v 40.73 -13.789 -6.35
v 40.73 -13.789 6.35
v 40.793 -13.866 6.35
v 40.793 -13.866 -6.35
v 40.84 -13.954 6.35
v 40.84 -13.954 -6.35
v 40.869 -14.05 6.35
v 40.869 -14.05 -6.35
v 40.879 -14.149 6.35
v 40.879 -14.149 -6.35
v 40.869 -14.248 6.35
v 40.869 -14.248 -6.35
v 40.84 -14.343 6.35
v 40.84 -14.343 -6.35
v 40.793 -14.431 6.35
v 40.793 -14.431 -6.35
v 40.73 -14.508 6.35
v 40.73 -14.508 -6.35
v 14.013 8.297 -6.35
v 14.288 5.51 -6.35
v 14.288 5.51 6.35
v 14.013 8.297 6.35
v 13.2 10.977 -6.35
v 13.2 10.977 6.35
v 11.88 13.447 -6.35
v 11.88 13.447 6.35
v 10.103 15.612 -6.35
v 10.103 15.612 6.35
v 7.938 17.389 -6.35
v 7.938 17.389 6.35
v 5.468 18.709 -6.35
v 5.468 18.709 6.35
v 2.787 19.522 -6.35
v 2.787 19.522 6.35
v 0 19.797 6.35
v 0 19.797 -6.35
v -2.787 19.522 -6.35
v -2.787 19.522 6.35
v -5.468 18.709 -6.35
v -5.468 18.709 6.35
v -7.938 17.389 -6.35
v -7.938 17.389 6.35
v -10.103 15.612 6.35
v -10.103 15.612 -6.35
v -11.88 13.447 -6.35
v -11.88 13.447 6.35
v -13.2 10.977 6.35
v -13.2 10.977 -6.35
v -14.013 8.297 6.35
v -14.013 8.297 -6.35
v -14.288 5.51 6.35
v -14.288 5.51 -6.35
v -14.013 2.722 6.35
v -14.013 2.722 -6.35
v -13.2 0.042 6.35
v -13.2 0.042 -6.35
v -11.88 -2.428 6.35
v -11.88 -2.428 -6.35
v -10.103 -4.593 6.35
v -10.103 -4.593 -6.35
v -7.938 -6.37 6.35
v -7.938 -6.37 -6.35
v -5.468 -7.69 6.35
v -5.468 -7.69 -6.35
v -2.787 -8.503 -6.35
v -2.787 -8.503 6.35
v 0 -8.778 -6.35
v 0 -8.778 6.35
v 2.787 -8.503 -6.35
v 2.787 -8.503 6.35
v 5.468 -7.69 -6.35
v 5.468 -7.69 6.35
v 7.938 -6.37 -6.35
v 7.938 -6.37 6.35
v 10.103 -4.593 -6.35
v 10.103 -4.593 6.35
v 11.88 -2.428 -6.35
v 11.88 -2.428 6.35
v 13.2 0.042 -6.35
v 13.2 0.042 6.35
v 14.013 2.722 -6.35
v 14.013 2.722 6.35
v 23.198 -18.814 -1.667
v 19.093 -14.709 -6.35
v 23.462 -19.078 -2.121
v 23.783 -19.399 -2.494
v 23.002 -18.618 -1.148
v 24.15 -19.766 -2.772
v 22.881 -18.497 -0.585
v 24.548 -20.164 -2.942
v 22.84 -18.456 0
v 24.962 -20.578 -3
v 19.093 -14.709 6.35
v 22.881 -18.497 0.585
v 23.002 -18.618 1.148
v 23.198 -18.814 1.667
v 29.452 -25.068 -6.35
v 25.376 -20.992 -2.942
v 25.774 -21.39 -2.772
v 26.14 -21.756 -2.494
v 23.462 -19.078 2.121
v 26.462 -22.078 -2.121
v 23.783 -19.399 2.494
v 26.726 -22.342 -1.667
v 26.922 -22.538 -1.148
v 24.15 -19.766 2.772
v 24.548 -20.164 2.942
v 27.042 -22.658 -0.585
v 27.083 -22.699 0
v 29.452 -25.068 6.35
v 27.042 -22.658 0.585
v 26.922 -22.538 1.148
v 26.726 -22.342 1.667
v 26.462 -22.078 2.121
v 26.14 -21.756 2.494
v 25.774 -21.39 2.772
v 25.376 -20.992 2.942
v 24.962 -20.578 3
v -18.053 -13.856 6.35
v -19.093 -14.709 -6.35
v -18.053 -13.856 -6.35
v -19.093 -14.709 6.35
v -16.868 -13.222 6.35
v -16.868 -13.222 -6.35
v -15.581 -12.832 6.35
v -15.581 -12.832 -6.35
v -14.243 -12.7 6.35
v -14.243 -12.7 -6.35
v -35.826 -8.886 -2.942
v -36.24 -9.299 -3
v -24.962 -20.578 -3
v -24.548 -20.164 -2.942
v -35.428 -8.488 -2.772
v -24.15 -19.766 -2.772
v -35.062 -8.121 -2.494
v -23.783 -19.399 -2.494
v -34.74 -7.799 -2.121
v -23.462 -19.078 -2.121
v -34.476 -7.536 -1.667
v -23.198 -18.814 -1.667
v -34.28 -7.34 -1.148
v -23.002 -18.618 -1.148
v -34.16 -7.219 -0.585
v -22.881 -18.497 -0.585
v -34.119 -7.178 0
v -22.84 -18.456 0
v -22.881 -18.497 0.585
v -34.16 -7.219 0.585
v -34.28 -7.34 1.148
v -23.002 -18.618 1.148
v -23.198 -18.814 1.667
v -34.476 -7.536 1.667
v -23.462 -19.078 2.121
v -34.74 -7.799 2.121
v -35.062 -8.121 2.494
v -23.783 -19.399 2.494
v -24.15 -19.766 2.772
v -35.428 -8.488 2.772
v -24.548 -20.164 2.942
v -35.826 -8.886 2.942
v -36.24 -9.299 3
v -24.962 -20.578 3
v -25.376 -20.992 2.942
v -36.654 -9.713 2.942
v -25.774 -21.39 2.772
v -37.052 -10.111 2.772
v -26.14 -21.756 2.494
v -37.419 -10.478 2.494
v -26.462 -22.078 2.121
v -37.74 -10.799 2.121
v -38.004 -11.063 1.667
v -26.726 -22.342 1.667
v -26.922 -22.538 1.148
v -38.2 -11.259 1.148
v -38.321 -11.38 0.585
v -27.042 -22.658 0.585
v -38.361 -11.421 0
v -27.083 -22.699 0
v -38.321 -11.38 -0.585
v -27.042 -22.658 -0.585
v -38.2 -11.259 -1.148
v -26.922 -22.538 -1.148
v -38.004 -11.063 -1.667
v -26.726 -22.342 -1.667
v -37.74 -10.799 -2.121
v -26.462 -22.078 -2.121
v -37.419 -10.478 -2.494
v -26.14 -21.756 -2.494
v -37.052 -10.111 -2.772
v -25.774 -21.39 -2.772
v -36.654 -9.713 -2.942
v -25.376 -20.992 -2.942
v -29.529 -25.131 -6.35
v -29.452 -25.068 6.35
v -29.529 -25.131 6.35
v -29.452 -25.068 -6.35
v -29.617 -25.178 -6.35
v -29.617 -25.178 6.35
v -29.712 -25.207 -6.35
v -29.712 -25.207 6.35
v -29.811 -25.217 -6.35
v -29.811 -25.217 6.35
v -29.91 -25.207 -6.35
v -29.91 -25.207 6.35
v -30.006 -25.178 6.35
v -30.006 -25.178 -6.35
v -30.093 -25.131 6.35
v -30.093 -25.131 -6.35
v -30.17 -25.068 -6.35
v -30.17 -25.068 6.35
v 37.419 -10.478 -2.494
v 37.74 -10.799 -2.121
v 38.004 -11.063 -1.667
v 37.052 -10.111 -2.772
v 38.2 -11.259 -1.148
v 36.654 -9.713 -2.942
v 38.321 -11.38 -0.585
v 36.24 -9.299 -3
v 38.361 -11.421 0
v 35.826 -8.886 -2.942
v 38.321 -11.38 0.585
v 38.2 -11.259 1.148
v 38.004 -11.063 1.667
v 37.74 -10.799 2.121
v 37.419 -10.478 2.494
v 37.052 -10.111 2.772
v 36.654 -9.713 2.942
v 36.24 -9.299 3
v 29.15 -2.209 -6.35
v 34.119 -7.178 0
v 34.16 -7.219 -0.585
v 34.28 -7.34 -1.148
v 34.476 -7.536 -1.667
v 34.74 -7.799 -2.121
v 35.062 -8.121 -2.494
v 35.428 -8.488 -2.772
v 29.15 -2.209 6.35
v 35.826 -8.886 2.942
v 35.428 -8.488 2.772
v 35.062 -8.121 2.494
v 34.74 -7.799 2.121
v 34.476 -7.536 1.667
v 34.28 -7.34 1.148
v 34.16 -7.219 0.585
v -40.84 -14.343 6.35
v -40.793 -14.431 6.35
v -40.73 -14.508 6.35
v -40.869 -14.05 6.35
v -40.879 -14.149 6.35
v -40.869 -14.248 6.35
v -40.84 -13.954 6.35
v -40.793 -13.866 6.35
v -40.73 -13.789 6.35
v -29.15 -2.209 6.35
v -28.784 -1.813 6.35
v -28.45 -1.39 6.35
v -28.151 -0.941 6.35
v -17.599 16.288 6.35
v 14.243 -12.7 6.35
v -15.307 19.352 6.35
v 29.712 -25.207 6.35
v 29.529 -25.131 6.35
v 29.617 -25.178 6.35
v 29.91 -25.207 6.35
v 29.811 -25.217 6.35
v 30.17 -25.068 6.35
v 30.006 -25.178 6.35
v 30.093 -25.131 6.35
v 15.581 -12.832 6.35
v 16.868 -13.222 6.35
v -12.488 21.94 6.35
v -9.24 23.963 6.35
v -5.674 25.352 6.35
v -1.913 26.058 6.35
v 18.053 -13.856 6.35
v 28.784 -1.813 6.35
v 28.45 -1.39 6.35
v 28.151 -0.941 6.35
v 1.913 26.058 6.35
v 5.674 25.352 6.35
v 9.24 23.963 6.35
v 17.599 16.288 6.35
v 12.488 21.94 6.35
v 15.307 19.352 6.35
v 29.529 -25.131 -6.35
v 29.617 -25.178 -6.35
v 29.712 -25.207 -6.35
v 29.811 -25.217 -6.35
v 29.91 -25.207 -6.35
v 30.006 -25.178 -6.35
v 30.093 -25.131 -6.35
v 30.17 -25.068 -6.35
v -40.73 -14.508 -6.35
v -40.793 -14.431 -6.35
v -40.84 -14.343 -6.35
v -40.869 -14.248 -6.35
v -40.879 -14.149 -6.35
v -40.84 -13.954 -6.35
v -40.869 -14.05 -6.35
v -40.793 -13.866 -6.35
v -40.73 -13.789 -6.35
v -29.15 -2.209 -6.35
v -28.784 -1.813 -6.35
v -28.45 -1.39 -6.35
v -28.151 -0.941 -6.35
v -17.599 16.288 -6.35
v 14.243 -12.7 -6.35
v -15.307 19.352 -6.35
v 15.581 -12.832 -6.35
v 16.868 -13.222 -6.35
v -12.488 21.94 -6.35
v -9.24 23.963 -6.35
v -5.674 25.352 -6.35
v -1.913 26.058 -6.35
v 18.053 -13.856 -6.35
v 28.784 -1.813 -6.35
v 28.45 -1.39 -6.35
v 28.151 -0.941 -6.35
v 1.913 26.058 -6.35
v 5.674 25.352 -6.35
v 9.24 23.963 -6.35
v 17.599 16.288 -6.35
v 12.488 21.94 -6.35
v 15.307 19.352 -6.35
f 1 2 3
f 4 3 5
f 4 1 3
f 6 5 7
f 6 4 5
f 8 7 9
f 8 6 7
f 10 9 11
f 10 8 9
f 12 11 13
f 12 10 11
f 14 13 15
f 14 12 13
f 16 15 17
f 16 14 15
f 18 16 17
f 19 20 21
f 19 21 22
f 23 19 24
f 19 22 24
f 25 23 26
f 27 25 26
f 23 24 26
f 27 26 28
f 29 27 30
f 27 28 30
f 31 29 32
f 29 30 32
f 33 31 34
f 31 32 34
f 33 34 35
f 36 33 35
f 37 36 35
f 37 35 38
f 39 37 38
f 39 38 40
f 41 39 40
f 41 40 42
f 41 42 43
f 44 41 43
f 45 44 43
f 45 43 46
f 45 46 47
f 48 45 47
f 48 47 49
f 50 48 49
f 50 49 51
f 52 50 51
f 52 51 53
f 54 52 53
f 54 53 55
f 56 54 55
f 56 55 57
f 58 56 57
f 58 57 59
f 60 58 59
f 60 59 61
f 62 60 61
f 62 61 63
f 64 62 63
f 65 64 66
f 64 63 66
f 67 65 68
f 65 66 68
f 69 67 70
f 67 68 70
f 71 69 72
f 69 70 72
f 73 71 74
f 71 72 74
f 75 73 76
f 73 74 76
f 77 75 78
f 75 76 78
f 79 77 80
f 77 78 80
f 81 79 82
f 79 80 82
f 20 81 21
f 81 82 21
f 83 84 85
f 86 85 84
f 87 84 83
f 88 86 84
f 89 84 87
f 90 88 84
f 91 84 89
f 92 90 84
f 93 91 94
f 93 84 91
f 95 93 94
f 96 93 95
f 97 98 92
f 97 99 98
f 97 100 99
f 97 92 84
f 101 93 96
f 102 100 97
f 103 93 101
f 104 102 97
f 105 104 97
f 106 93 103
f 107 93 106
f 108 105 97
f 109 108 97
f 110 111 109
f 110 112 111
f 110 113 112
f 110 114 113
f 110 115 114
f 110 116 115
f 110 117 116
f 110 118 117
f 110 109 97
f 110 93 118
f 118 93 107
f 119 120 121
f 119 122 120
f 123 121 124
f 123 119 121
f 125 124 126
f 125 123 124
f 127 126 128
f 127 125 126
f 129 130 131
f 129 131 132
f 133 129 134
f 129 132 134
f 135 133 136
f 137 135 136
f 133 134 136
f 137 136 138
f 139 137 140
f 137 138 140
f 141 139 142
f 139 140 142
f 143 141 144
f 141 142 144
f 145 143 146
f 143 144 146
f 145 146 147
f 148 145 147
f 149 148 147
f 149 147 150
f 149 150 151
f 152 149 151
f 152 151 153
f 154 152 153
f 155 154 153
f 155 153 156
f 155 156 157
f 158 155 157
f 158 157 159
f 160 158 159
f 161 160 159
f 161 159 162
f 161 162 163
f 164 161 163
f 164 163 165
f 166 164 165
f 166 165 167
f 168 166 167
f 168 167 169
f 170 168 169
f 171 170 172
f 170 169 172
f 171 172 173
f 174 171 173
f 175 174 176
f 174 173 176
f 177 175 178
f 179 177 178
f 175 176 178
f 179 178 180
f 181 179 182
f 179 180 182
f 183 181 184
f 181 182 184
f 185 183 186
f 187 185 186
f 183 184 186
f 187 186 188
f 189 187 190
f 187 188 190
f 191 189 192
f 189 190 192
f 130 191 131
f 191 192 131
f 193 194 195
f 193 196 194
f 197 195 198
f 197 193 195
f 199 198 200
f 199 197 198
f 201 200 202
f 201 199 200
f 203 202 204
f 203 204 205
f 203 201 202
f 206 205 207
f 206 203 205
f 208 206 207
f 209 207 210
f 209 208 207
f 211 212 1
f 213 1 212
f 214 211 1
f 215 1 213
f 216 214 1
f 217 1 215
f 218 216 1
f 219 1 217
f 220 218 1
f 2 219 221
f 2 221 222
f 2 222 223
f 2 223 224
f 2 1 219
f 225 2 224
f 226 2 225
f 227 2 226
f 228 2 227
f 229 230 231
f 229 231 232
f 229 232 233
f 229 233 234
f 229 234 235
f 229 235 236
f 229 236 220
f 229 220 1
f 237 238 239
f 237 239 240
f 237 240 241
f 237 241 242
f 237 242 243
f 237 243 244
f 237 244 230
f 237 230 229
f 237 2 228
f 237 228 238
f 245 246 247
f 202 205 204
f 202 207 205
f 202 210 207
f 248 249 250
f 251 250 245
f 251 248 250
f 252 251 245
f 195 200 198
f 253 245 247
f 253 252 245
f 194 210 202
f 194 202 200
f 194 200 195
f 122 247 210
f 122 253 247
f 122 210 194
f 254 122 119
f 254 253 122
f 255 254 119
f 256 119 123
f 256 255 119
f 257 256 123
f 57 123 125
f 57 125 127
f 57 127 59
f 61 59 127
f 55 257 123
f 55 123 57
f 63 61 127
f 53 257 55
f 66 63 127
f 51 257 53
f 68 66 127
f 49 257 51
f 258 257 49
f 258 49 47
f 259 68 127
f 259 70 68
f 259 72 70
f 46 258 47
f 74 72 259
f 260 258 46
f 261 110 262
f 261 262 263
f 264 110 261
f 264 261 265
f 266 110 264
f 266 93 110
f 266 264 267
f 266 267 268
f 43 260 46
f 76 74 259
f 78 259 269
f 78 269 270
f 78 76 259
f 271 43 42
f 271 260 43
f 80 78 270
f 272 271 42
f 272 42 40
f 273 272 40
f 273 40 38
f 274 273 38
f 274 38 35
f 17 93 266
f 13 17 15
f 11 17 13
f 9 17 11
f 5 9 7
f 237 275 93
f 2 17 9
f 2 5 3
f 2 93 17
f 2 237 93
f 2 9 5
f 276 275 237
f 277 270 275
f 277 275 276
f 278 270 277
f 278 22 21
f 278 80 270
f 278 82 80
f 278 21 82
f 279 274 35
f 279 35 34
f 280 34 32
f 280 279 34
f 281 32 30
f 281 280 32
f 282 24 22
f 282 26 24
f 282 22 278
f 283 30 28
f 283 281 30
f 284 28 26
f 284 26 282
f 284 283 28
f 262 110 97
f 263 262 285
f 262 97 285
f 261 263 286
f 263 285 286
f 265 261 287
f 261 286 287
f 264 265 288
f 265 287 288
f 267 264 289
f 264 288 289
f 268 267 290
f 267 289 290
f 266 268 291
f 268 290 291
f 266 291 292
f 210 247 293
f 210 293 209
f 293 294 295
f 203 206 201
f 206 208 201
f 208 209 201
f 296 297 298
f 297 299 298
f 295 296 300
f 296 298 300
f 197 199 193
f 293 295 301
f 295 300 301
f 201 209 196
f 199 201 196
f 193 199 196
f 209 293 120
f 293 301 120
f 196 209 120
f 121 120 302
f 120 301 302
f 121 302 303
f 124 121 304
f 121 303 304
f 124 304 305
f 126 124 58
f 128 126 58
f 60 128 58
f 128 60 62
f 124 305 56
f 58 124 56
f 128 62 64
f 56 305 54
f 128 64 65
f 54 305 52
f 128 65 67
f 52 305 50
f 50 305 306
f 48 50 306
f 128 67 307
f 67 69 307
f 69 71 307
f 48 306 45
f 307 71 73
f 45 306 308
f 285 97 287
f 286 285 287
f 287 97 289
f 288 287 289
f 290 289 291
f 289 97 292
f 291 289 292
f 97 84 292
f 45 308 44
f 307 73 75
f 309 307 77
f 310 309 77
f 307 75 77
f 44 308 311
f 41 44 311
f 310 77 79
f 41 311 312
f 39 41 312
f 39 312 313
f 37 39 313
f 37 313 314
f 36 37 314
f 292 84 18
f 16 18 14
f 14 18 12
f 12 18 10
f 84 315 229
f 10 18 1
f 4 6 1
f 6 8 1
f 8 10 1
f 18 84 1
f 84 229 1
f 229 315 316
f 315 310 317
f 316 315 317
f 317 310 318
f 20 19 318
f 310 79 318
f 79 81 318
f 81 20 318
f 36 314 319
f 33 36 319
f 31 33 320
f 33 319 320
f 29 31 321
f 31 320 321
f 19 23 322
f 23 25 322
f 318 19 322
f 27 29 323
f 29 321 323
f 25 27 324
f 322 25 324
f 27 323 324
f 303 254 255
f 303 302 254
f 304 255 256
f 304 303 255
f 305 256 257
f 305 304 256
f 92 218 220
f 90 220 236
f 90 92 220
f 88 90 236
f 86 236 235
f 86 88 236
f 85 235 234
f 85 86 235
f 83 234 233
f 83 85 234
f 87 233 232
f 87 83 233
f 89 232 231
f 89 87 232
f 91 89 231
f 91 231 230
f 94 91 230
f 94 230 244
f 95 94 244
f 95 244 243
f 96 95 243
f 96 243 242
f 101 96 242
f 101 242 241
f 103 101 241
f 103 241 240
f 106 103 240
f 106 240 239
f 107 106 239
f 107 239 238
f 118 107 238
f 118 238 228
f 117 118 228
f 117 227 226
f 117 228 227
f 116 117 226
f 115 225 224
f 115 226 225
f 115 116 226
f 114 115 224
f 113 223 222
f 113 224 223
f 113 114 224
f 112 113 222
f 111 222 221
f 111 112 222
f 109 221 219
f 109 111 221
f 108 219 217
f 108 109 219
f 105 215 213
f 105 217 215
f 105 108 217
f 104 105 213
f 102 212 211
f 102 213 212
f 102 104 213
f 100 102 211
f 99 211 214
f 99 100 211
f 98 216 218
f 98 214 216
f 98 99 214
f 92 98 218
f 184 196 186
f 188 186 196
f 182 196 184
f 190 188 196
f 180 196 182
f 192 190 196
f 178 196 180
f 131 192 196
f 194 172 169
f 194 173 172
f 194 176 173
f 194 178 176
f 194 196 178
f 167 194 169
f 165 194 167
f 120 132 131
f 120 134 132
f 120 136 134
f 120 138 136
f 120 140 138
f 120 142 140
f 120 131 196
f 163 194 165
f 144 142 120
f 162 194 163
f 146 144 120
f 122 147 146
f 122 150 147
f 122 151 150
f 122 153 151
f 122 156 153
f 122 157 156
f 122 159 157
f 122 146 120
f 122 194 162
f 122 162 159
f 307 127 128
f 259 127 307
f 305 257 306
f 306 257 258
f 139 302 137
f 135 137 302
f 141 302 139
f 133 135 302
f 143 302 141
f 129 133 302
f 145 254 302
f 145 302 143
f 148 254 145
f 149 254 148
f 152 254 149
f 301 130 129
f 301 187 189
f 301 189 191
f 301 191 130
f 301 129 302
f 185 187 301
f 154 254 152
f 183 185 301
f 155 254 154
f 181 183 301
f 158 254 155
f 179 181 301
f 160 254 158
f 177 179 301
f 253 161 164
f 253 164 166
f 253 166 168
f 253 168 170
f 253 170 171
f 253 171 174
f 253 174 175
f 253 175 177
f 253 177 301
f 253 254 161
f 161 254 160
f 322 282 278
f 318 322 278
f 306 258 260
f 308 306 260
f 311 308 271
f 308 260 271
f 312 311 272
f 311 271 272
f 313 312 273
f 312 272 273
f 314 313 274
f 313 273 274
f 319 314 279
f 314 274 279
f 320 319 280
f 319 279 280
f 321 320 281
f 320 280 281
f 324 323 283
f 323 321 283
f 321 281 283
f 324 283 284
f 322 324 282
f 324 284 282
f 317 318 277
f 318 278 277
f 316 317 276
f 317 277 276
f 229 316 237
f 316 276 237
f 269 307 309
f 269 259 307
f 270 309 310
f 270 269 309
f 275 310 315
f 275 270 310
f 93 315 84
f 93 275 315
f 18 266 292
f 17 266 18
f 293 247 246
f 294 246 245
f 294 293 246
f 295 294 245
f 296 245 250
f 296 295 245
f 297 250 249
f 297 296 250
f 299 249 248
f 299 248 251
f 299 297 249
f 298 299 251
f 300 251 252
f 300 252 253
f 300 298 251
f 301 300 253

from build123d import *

# Parameters (mm, degrees)
BOSS_EXTRUDE1_DEPTH             = 6.35
SKETCH2_R                       = 14.2875
CUT_EXTRUDE1_DEPTH              = 141.169556232
F_6_0MM_CLEARANCE_DOWEL_HOLE1_D = 6
CUT_EXTRUDE2_DEPTH              = 77.016140262
CUT_EXTRUDE3_DEPTH              = 55.213982826
FILLET1_R                       = 6.858
FILLET2_R                       = 0.508


with BuildPart() as part:
    # Sketch1 → Boss-Extrude1 (new, symmetric)
    with BuildSketch(Plane.XY):
        Polygon((-48.967108015, -44.583045972), (-17.084062043, -12.7), (17.084062043, -12.7), (48.967108015, -44.583045972), (60.245461175, -33.304692812), (28.575, -1.634231637), (28.575, 33.007903412), (-28.575, 33.007903412), (-28.575, -1.634231637), (-60.245461175, -33.304692812), align=None)
    extrude(amount=BOSS_EXTRUDE1_DEPTH, both=True)

    # Sketch2 → Cut-Extrude1 (cut, through all)
    with BuildSketch(Plane(origin=(0, -92.915481637, 6.35), x_dir=(1, 0, 0), z_dir=(0, 0, 1))):
        with Locations((0, 98.425)):
            Circle(SKETCH2_R)
    extrude(amount=-CUT_EXTRUDE1_DEPTH, mode=Mode.SUBTRACT)

    # Ø6.0mm Clearance Dowel Hole1 (through all)
    with Locations(Plane(origin=(-59.928125, -32.987356637, 33.65), x_dir=(0, 0, 1), z_dir=(-0.7071067811865488, 0.7071067811865464, 0))):
        with Locations((-33.65, 33.499886537)):
            f_6_0mm_clearance_dowel_hole1 = Hole(F_6_0MM_CLEARANCE_DOWEL_HOLE1_D / 2)

    # Sketch5 → Cut-Extrude2 (cut, through all)
    with BuildSketch(Plane.XY.offset(6.35)):
        Polygon((-41.089466366, -14.148698003), (-29.811113206, -25.427051163), (29.811113206, -25.427051163), (41.089466366, -14.148698003), (91.882290576, -14.148698003), (91.882290576, -80.233341252), (-80.675634817, -80.233341252), (-80.675634817, -14.148698003), align=None)
    extrude(amount=-CUT_EXTRUDE2_DEPTH, mode=Mode.SUBTRACT)

    # Mirror1: Ø6.0mm Clearance Dowel Hole1 across plane
    add(f_6_0mm_clearance_dowel_hole1.mirror(Plane(origin=(0, 0, 0), x_dir=(0, 0, 1), z_dir=(1, 0, 0))), mode=Mode.SUBTRACT)

    # Sketch6 → Cut-Extrude3 (cut, through all)
    with BuildSketch(Plane.XY.offset(6.35)):
        with BuildLine():
            Line((-28.575, -1.634231637), (-17.599390848, 16.28763731))
            ThreePointArc((-17.599390848, 16.28763731), (0, 26.147018363), (17.599390848, 16.28763731))
            Line((17.599390848, 16.28763731), (28.575, -1.634231637))
            Line((28.575, -1.634231637), (28.575, 33.007903412))
            Line((28.575, 33.007903412), (-28.575, 33.007903412))
            Line((-28.575, 33.007903412), (-28.575, -1.634231637))
        make_face()
    extrude(amount=-CUT_EXTRUDE3_DEPTH, mode=Mode.SUBTRACT)

    # Fillet1
    fillet1_edges = [part.edges().sort_by_distance(p)[0] for p in [
        (-28.575, -1.634231637, 0),
        (28.575, -1.634231637, 0),
        (17.084062043, -12.7, 0),
        (-17.084062043, -12.7, 0),
    ]]
    fillet(fillet1_edges, radius=FILLET1_R)

    # Fillet2
    fillet2_edges = [part.edges().sort_by_distance(p)[0] for p in [
        (-41.089466366, -14.148698003, 0),
        (-29.811113206, -25.427051163, 0),
        (29.811113206, -25.427051163, 0),
        (41.089466366, -14.148698003, 0),
    ]]
    fillet(fillet2_edges, radius=FILLET2_R)


solid = part.part
